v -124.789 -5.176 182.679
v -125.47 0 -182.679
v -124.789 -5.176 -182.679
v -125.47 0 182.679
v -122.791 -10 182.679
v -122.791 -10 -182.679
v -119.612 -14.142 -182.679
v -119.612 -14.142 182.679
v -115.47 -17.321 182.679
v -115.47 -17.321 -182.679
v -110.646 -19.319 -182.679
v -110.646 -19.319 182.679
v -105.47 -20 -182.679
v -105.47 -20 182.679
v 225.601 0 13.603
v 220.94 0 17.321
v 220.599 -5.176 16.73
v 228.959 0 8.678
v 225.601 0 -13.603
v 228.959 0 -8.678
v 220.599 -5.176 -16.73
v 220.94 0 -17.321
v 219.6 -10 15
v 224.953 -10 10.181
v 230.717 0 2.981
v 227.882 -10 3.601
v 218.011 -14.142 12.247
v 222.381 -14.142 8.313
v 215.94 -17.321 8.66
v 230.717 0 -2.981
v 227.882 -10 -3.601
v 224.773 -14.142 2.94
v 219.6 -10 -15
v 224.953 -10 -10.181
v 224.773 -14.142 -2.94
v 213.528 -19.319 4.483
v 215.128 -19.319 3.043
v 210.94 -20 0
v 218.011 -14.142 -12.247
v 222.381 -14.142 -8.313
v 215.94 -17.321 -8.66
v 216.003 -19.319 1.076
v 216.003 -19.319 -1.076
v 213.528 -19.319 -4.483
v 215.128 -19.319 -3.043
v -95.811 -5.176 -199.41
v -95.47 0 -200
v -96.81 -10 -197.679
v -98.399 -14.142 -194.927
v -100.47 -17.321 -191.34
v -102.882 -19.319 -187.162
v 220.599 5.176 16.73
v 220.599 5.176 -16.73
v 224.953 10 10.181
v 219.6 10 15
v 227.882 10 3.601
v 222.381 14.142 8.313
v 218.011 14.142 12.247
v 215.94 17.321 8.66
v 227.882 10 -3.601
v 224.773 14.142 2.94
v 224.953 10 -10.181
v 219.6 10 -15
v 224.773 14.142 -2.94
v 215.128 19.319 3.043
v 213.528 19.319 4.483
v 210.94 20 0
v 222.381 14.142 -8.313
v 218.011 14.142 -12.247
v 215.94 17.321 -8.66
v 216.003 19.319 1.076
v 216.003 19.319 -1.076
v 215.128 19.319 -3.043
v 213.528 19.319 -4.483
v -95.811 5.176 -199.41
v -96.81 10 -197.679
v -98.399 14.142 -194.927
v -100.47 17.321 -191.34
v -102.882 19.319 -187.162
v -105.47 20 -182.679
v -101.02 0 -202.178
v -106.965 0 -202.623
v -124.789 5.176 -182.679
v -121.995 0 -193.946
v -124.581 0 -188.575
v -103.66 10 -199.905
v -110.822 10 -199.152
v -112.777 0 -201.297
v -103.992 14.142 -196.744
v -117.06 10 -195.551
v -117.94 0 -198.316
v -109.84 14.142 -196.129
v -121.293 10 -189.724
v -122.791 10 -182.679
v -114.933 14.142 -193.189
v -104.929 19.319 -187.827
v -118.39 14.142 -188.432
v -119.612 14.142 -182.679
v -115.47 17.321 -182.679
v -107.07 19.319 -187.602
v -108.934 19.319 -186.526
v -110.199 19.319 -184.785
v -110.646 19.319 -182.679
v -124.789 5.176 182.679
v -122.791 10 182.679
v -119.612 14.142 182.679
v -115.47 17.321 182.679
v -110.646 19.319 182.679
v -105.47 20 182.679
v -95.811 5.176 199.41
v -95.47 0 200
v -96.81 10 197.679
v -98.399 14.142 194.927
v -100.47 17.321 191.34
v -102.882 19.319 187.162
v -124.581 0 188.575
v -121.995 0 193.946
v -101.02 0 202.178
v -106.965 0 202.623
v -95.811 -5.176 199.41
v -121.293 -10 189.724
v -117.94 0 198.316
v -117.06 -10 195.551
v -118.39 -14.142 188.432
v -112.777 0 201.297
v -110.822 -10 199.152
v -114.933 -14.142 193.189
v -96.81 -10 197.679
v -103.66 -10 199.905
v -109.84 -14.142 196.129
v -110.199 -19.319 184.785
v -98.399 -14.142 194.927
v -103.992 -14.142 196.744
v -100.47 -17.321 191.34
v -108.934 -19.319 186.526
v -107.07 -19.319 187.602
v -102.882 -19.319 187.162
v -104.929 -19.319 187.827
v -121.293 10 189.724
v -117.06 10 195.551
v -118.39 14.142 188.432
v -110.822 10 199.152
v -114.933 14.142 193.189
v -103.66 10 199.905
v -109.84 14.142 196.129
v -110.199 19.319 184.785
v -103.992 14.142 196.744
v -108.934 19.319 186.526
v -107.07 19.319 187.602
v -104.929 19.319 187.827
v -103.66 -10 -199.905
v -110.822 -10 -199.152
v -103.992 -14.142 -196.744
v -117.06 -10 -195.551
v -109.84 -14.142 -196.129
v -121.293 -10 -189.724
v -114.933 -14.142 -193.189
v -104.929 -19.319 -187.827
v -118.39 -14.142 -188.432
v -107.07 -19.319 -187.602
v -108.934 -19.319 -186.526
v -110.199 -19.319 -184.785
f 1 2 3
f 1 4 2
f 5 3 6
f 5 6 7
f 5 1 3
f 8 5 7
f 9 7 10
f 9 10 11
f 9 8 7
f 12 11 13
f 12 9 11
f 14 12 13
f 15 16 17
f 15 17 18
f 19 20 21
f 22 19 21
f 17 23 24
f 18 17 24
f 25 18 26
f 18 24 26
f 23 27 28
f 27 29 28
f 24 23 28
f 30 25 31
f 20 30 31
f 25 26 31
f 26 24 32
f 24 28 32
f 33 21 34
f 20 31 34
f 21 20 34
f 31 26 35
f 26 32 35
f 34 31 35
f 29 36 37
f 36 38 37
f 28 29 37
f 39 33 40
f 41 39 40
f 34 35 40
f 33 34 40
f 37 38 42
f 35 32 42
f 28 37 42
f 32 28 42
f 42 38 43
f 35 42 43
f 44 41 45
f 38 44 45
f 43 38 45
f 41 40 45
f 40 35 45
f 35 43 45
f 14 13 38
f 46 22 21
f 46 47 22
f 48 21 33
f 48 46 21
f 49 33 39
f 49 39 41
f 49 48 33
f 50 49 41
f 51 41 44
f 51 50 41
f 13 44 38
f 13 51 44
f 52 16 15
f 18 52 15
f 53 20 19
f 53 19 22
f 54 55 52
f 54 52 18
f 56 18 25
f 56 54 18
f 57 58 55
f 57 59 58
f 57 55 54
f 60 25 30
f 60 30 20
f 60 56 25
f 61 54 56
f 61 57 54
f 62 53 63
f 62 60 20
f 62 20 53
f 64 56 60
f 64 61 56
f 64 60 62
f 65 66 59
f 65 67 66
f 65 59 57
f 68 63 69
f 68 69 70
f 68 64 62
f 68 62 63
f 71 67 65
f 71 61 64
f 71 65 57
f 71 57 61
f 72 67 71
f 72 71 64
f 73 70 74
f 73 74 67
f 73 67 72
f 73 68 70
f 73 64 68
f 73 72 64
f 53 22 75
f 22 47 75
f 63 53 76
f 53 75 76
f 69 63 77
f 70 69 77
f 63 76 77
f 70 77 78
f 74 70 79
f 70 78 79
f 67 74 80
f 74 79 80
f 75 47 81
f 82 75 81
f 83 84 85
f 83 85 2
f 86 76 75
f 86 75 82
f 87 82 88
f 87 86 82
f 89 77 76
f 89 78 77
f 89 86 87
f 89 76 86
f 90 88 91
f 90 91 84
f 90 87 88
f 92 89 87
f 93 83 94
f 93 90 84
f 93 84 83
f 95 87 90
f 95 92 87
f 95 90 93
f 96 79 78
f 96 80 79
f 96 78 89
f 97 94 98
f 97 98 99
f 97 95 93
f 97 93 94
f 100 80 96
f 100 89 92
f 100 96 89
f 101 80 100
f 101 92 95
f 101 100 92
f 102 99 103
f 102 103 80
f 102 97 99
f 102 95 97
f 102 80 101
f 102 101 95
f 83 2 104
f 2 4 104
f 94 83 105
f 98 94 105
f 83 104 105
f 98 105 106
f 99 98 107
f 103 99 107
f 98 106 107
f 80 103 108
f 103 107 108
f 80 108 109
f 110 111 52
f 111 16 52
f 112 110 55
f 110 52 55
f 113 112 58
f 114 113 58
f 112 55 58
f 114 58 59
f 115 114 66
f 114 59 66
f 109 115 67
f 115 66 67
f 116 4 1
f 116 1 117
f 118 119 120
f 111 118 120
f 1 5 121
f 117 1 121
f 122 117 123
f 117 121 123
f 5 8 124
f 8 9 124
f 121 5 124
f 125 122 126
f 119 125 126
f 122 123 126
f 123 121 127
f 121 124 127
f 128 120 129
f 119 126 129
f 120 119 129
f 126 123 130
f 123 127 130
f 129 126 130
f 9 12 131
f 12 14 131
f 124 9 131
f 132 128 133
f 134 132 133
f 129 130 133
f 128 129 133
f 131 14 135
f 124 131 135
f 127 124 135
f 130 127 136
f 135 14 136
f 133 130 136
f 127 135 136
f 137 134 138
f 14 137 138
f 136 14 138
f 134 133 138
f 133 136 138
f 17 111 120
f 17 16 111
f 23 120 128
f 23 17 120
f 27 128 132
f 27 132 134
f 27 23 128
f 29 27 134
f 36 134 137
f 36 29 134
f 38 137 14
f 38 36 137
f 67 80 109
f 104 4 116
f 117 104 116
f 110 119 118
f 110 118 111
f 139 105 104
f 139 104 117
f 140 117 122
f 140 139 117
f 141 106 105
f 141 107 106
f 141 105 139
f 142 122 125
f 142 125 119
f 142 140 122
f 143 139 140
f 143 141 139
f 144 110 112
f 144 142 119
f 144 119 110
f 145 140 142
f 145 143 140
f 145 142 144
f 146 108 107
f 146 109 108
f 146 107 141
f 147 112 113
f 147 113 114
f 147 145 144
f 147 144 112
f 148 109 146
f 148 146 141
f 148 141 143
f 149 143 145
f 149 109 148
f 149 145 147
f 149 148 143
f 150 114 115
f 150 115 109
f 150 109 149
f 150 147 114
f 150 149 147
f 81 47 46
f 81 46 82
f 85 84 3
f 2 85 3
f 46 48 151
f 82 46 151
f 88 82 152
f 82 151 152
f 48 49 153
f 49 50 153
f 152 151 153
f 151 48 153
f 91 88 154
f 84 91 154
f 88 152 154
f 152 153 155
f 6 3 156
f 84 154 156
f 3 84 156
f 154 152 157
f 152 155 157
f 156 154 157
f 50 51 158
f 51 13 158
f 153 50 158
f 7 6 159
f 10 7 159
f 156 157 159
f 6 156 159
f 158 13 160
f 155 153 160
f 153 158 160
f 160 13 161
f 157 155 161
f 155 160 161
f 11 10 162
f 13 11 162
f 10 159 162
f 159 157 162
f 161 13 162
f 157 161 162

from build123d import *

# Parameters (mm, degrees)
BOSS_EXTRUDE1_DEPTH        = 20
BOSS_EXTRUDE1_DEPTH_BACK   = 20
SKETCH1_R                  = 9.5041e-05
BOSS_EXTRUDE1_2_DEPTH      = 20
BOSS_EXTRUDE1_2_DEPTH_BACK = 20
FILLET1_R                  = 20


with BuildPart() as part:
    # Sketch1 → Boss-Extrude1 (new, two sides: drawn at the far end of the back side and taken through both)
    with BuildSketch(Plane(origin=(0, 0, 0), x_dir=(1, 0, 0), z_dir=(0, 1, 0)).offset(-BOSS_EXTRUDE1_DEPTH_BACK)):
        with Locations(Location((250.94, 0, 0), (0, 0, 270))):
            Circle(SKETCH1_R)
    extrude(amount=BOSS_EXTRUDE1_DEPTH + BOSS_EXTRUDE1_DEPTH_BACK)


with BuildPart() as body_2:
    # Sketch1 → Boss-Extrude1 2 (new, two sides: drawn at the far end of the back side and taken through both)
    with BuildSketch(Plane(origin=(0, 0, 0), x_dir=(1, 0, 0), z_dir=(0, 1, 0)).offset(-BOSS_EXTRUDE1_2_DEPTH_BACK)):
        with BuildLine():
            Line((220.94, 17.320508076), (-95.47, 199.99990675))
            ThreePointArc((-95.47, 199.99990675), (-115.47, 199.99990675), (-125.47, 182.679398674))
            Line((-125.47, 182.679398674), (-125.47, -182.679398674))
            ThreePointArc((-125.47, -182.679398674), (-115.47, -199.99990675), (-95.47, -199.99990675))
            Line((-95.47, -199.99990675), (220.94, -17.320508076))
            ThreePointArc((220.94, -17.320508076), (230.94, 0), (220.94, 17.320508076))
        make_face()
    extrude(amount=BOSS_EXTRUDE1_2_DEPTH + BOSS_EXTRUDE1_2_DEPTH_BACK)

    # Fillet1
    fillet1_edges = [body_2.edges().sort_by_distance(p)[0] for p in [
        (-125.47, -20, 0),
        (-115.47, -20, 199.99990675),
        (62.735, -20, 108.660207413),
        (230.94, -20, 0),
        (62.735, -20, -108.660207413),
        (-115.47, -20, -199.99990675),
        (-115.47, 20, -199.99990675),
        (62.735, 20, -108.660207413),
        (230.94, 20, 0),
        (62.735, 20, 108.660207413),
        (-115.47, 20, 199.99990675),
        (-125.47, 20, 0),
    ]]
    fillet(fillet1_edges, radius=FILLET1_R - 0.0001)  # a hair under: the kernel refuses the full size


solid = body_2.part
